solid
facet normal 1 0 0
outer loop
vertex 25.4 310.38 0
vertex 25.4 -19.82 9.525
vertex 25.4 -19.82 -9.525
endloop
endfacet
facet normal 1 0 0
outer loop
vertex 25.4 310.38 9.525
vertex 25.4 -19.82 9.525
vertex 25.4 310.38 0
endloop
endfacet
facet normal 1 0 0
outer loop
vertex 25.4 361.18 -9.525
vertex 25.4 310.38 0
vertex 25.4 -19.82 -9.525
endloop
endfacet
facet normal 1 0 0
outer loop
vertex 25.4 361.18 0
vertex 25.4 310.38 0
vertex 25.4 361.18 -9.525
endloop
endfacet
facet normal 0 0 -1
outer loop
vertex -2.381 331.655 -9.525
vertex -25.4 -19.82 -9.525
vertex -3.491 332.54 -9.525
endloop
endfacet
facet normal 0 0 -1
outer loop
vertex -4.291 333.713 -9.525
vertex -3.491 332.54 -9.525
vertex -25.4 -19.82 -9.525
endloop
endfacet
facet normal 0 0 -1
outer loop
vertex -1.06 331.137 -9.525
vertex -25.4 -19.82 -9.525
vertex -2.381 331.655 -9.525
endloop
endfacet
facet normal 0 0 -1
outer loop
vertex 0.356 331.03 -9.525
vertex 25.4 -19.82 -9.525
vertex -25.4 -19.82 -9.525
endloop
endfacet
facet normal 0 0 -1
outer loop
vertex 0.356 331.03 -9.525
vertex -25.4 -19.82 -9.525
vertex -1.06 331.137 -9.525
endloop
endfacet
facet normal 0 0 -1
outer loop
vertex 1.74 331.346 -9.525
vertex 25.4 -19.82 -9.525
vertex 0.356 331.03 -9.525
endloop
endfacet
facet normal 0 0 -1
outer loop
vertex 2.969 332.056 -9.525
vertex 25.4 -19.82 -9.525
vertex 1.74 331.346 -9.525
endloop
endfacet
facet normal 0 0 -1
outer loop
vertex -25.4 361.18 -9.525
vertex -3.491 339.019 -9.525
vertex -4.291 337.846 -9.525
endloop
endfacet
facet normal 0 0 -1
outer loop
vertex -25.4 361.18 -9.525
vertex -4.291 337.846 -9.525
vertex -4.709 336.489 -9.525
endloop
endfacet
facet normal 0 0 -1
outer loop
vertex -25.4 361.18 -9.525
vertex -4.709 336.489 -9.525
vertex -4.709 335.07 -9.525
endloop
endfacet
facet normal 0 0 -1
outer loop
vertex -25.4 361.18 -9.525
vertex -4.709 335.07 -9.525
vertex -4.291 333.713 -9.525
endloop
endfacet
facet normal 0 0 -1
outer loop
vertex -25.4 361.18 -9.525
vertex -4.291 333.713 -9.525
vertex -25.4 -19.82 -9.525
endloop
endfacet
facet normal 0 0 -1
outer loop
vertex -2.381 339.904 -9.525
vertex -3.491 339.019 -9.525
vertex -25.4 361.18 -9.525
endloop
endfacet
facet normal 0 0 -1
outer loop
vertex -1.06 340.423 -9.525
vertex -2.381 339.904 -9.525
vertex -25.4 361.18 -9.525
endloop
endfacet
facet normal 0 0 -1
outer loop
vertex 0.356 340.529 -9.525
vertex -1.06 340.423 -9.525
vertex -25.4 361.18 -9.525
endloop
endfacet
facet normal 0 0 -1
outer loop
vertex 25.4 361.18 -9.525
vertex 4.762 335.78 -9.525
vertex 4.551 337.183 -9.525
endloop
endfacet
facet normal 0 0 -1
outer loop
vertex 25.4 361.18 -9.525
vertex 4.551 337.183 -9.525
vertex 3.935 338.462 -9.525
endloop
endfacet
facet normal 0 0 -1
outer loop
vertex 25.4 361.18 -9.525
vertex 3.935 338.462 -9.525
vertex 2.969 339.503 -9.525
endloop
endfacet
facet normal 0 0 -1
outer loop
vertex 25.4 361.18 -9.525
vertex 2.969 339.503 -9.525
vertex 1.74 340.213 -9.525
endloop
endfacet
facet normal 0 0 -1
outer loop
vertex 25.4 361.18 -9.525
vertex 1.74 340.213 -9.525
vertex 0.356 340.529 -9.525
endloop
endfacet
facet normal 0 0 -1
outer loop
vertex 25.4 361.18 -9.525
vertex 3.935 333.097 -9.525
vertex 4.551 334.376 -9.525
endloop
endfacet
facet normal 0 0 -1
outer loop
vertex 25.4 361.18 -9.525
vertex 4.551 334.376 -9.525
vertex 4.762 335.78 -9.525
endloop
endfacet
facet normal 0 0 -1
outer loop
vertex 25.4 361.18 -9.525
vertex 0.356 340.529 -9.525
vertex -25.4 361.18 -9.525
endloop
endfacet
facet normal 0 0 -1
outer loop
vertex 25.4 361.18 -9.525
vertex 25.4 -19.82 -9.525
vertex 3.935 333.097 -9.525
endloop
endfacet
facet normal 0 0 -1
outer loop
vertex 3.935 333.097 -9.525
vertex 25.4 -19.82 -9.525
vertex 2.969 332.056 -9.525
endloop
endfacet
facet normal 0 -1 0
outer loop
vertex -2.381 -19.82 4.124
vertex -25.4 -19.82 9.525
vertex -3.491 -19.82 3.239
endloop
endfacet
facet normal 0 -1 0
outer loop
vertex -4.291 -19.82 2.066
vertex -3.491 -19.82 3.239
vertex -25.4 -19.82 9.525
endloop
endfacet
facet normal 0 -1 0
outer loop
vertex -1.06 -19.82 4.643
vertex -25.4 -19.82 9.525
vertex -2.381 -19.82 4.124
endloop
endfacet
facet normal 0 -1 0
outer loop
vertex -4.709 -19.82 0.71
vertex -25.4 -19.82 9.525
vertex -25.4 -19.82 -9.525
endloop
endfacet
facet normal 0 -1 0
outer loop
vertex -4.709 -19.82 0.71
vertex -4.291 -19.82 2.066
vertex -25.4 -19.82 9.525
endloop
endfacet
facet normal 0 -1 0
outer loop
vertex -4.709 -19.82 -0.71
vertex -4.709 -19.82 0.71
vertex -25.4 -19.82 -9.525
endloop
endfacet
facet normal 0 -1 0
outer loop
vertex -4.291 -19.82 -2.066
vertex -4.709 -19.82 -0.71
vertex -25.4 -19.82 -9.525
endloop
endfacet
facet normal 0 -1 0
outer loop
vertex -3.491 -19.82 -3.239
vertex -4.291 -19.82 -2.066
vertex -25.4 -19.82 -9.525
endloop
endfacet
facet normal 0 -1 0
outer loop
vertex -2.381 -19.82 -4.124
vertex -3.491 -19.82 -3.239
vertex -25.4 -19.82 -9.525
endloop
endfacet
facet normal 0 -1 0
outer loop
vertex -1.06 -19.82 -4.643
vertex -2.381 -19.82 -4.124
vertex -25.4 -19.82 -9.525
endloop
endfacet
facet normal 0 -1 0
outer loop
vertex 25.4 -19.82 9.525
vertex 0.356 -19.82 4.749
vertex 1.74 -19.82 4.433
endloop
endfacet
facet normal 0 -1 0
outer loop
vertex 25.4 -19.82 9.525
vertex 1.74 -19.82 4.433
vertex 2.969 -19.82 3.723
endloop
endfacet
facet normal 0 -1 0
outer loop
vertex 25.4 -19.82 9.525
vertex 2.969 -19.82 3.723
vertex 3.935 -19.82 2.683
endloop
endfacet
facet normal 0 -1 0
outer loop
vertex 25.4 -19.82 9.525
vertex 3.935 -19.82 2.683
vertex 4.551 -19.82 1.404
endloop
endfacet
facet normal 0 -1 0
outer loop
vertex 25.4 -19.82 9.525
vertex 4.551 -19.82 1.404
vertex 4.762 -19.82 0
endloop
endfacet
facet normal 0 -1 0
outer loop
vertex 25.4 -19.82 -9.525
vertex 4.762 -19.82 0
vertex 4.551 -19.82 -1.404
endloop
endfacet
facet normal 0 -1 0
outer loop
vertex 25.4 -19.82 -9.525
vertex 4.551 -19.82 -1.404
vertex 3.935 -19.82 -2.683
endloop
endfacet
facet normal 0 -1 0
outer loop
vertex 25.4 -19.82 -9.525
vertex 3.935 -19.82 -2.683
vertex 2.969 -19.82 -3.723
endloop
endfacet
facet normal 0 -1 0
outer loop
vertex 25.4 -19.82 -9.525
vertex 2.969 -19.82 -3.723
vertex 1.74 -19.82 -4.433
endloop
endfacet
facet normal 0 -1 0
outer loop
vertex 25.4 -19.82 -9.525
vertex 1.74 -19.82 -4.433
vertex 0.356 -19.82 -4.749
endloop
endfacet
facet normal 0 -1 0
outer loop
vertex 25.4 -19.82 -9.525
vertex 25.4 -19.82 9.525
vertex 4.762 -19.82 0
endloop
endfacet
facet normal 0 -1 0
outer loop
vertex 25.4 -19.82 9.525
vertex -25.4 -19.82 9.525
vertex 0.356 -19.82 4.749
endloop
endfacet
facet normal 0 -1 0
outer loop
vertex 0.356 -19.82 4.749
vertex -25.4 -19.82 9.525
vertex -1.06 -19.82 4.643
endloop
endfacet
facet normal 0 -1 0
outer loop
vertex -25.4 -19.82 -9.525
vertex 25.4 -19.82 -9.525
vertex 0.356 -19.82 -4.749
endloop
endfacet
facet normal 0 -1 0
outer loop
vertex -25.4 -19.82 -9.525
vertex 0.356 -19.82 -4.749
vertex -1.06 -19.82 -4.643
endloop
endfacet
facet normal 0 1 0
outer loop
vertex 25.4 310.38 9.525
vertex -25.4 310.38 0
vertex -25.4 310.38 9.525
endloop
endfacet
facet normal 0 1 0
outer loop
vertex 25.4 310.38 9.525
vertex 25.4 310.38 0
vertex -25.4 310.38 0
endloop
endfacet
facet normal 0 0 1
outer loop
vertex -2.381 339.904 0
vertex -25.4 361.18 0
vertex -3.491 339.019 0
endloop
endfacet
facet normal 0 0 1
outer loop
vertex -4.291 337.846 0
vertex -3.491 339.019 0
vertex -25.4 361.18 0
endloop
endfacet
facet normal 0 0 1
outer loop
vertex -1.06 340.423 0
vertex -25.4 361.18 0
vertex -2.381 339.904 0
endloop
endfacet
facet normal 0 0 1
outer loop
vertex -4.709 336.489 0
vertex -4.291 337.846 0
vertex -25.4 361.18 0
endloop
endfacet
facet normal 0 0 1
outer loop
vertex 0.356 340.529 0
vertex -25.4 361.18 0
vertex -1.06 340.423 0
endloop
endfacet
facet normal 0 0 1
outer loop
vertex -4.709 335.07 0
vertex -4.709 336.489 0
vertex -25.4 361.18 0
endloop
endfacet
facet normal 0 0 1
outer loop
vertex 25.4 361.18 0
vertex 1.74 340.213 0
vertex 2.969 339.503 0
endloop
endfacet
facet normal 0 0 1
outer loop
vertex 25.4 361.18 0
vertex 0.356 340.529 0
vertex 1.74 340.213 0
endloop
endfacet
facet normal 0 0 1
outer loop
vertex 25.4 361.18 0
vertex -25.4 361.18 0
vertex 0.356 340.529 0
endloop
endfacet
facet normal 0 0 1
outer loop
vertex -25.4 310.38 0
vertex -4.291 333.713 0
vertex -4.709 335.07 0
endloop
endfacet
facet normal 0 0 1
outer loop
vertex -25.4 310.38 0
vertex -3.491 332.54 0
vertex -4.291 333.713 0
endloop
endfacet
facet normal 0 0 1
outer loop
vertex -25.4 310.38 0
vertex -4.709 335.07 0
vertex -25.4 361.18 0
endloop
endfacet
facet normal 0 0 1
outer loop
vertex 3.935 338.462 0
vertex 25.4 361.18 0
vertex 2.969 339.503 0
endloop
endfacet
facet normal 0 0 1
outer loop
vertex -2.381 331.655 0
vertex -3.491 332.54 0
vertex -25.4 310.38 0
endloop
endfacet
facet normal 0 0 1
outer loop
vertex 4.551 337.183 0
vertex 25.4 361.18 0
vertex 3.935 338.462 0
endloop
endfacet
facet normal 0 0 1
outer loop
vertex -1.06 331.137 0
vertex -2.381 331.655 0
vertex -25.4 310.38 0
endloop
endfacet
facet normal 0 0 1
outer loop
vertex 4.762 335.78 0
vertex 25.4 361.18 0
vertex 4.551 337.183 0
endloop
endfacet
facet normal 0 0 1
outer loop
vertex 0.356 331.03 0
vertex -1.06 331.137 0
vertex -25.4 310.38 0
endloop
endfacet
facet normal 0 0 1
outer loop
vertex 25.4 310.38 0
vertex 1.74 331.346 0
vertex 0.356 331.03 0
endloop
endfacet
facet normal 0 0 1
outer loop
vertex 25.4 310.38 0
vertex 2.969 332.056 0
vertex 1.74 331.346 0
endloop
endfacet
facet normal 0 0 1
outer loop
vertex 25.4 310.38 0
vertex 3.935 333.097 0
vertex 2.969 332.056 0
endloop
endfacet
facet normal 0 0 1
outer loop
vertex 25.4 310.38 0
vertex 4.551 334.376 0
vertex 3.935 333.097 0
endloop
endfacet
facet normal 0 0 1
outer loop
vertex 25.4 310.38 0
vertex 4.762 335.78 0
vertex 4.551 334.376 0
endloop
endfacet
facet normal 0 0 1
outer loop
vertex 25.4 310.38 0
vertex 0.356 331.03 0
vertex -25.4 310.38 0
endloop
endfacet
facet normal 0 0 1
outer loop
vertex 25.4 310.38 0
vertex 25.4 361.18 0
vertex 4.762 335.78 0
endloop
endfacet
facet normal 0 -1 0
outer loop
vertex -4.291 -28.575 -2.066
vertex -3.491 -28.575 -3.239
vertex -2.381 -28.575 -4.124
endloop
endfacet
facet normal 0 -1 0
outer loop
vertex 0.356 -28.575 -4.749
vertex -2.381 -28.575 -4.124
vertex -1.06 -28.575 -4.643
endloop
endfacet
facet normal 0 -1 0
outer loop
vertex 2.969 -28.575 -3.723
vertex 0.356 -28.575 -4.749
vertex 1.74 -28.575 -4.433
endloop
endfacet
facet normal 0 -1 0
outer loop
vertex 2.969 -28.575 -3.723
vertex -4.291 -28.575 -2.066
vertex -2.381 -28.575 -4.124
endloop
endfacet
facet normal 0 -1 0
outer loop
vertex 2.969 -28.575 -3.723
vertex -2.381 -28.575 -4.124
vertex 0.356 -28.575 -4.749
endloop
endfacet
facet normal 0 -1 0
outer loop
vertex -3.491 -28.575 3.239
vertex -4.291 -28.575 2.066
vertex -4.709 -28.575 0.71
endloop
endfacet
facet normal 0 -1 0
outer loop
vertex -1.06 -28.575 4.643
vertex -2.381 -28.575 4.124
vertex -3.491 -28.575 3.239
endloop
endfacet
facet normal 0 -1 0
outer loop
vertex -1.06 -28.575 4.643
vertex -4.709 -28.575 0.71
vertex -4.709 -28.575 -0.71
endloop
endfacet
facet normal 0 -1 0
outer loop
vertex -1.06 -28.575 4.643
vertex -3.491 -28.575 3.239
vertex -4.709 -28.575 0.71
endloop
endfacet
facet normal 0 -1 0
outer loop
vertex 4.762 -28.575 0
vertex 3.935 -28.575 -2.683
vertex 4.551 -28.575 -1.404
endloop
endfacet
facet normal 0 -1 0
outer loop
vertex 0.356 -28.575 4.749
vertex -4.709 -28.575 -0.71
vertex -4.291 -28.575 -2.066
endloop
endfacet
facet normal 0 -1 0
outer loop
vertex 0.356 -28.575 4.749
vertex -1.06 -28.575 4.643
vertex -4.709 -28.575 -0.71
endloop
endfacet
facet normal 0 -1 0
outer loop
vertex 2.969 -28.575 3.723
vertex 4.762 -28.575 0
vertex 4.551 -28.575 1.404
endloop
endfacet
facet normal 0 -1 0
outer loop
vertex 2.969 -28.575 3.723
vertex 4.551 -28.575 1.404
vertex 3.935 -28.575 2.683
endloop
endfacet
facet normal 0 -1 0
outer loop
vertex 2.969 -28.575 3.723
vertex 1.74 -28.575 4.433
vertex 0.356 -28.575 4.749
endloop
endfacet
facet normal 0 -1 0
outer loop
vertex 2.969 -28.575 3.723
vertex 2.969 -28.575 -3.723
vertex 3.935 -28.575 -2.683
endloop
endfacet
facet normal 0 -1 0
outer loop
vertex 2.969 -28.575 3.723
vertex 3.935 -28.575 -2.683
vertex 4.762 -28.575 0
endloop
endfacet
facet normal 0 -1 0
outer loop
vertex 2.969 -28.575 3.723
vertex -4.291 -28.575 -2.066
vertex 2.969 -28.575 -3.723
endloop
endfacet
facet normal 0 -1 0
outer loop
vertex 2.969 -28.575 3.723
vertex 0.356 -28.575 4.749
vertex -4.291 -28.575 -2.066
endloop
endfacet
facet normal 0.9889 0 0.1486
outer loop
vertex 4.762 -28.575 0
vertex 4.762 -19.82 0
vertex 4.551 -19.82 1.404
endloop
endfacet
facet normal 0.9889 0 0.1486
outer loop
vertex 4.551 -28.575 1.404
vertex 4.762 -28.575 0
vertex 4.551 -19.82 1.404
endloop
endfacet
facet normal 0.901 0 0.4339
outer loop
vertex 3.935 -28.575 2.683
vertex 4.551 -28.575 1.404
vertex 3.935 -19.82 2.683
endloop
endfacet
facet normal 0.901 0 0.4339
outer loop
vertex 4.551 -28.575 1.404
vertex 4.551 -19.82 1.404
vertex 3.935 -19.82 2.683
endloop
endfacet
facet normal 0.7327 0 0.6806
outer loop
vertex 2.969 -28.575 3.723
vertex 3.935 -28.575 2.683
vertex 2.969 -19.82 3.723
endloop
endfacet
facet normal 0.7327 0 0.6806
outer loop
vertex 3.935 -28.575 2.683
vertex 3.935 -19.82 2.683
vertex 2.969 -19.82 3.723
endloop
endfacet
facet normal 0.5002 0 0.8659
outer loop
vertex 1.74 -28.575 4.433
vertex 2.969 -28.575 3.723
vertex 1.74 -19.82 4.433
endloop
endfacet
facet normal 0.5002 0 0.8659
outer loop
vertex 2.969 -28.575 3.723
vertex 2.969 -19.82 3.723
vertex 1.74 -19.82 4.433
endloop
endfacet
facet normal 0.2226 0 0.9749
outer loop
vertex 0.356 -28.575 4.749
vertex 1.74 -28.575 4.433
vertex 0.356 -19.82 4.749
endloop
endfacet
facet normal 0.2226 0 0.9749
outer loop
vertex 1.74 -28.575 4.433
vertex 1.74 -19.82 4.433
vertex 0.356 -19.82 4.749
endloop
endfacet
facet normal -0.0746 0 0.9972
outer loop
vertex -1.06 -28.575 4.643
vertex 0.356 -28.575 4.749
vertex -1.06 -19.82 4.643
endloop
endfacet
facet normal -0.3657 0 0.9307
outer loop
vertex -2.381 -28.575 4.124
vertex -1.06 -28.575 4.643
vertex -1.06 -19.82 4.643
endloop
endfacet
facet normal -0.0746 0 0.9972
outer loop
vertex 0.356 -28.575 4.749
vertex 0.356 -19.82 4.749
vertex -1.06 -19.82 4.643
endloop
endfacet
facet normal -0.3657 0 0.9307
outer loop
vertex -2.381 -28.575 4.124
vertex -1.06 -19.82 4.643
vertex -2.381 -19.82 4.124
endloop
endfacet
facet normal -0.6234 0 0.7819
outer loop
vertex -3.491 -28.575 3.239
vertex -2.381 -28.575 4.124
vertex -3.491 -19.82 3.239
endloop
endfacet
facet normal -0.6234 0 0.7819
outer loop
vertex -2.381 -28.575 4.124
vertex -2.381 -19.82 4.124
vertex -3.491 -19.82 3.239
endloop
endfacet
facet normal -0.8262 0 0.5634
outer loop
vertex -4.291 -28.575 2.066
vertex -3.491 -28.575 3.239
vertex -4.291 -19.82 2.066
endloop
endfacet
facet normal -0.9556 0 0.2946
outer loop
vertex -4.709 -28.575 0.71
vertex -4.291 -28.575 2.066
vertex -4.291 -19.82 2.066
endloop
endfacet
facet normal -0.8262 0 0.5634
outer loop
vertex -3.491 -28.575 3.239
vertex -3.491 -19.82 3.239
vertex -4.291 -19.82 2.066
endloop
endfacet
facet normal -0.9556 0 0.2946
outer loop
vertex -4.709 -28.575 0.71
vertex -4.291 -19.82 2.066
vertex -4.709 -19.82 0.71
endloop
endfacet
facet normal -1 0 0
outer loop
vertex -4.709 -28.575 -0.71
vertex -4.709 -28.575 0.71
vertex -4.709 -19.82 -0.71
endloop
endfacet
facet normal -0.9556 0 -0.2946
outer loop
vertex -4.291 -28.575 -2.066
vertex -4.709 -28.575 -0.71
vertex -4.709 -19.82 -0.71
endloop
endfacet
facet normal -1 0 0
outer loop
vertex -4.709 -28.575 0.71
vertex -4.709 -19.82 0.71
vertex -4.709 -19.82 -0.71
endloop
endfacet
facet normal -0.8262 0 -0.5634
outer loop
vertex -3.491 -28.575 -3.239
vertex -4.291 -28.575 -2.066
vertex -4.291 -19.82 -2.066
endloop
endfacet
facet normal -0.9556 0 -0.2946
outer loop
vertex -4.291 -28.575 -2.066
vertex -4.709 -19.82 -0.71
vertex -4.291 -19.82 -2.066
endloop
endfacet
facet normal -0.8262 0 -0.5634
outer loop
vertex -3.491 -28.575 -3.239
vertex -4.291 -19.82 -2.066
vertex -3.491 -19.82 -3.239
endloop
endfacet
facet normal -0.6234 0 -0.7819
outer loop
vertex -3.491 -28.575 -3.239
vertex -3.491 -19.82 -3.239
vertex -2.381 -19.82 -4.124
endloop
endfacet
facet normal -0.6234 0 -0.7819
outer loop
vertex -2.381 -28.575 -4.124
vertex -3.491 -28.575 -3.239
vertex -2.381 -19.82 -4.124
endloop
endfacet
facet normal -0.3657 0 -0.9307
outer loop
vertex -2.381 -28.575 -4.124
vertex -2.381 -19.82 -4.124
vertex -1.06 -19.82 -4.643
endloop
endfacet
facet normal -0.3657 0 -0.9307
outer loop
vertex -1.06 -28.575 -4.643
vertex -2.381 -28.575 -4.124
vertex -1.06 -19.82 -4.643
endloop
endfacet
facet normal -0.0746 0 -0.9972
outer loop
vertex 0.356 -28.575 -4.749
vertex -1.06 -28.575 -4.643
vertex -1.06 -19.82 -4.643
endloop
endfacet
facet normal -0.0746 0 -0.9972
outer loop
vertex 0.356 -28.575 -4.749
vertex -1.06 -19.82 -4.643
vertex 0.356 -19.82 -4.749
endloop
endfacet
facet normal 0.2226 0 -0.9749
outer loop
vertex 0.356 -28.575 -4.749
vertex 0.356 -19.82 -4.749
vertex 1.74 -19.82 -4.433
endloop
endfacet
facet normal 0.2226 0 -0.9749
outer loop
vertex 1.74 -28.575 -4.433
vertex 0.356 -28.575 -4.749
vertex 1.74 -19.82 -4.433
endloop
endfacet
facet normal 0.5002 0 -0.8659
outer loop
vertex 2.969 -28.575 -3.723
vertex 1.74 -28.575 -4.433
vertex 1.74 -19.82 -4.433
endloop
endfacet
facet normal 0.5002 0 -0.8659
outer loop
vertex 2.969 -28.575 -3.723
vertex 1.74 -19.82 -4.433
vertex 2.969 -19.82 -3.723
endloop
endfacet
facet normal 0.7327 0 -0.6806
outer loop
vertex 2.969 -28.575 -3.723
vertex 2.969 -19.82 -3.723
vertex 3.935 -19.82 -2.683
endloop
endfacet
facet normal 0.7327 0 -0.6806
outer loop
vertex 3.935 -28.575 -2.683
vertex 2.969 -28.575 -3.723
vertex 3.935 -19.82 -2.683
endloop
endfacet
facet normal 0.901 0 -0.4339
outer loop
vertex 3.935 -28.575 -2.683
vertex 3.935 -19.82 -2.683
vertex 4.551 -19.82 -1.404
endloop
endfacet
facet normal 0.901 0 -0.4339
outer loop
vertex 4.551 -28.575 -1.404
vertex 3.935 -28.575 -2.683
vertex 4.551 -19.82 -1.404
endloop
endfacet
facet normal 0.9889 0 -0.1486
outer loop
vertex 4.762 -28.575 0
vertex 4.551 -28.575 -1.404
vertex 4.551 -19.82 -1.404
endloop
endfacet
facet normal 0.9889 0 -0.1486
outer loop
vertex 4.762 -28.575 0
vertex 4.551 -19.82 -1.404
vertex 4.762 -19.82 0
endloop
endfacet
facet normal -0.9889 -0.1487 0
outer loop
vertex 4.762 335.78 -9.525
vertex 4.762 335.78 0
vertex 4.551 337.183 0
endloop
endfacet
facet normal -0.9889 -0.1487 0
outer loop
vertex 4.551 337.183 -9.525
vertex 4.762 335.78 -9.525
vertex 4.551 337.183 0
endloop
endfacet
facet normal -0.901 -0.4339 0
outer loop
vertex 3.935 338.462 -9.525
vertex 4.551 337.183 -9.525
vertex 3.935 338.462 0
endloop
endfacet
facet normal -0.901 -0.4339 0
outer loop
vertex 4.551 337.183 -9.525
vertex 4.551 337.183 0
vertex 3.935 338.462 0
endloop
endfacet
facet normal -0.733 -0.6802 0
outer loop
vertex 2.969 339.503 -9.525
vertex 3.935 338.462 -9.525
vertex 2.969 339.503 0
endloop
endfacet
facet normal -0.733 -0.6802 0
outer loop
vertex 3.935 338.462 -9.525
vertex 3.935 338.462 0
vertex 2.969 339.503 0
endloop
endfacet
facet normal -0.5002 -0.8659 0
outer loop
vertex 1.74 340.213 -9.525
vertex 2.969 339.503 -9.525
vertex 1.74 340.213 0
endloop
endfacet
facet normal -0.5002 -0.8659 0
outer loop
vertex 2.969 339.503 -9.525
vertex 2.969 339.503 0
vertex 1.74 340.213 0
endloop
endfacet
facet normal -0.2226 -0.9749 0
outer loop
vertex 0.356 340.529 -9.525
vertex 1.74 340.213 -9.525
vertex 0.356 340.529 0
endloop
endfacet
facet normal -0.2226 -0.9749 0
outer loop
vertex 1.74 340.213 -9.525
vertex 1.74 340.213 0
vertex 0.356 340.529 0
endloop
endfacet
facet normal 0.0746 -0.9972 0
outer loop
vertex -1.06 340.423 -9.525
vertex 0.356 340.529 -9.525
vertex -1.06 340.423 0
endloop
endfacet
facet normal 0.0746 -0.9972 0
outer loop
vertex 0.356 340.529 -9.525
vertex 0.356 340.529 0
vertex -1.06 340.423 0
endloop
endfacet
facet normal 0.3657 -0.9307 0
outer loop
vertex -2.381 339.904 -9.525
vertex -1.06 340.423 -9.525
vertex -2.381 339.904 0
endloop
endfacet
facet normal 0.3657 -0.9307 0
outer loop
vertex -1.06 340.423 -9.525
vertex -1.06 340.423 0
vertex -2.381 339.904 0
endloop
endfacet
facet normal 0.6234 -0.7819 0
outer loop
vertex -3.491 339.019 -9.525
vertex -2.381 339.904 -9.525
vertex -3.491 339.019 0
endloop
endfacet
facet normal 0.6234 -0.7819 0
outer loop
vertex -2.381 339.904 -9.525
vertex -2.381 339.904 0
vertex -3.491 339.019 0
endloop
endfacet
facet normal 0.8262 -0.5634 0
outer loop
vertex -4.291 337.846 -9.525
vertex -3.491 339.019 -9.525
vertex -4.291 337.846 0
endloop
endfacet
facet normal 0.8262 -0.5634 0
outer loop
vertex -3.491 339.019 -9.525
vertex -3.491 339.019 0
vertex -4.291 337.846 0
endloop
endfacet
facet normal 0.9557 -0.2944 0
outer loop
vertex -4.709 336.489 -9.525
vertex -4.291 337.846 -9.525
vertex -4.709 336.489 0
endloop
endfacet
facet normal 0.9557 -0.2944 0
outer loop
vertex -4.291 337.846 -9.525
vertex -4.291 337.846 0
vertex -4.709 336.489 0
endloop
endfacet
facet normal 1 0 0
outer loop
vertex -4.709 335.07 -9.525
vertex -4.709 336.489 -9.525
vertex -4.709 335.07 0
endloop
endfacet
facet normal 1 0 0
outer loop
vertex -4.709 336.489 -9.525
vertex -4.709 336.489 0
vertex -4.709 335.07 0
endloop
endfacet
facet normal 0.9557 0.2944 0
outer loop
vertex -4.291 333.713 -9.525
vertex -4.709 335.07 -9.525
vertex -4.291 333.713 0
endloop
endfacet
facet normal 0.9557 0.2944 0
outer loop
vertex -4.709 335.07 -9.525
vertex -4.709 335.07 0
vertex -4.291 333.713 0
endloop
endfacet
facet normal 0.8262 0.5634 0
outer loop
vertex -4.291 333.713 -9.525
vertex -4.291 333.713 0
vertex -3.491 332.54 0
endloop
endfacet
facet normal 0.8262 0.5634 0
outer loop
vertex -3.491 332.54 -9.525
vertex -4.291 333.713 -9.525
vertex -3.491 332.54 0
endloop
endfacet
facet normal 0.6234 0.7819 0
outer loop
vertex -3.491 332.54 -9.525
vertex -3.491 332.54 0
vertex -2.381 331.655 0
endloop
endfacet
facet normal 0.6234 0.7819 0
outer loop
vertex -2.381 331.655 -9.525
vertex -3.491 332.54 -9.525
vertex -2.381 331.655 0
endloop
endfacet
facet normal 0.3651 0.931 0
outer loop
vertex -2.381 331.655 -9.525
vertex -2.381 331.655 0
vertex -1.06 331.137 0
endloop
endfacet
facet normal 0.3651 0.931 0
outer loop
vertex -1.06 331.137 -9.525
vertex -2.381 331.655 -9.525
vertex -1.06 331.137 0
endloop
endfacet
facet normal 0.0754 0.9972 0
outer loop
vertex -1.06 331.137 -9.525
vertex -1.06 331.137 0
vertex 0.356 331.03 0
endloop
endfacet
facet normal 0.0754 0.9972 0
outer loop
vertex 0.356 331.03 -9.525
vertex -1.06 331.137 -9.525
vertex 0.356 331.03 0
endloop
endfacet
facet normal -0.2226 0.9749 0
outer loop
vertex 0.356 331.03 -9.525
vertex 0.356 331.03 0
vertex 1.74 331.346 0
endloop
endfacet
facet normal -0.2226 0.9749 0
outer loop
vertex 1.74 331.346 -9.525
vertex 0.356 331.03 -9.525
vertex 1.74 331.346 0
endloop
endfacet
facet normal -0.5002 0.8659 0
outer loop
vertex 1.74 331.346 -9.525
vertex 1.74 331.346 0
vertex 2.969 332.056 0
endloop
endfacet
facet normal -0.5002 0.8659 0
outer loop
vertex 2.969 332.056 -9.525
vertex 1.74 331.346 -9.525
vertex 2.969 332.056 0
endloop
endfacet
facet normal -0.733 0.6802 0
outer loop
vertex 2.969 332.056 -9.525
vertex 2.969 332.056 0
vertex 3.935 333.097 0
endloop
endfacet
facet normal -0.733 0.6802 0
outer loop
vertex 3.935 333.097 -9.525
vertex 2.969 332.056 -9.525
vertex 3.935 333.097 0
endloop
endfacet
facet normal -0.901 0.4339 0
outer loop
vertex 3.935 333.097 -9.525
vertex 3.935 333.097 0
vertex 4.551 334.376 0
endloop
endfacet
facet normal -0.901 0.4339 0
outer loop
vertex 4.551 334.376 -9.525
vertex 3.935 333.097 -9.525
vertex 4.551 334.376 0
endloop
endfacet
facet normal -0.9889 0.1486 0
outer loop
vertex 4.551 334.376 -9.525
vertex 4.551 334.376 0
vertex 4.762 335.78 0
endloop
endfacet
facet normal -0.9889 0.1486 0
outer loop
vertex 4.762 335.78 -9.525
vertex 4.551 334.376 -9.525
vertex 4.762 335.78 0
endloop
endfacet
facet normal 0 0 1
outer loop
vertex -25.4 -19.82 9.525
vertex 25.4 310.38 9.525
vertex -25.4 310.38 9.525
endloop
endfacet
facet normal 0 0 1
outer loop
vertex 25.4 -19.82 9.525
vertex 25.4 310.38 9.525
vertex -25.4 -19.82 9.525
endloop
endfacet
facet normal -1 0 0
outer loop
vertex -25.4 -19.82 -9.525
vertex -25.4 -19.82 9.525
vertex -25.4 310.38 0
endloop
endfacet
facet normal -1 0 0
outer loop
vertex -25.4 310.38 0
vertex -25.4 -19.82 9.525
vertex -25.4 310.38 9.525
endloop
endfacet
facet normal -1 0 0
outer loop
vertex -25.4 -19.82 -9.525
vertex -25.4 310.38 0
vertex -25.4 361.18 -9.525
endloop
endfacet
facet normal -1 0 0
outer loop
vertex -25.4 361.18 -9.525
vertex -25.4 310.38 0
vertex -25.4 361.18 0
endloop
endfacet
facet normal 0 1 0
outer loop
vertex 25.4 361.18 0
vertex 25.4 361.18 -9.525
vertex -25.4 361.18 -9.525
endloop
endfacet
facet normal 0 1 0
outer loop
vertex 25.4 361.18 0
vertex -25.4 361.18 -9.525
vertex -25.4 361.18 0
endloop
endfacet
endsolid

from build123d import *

# Parameters (mm, degrees)
F1_DEPTH = 25.4
F2_R     = 4.7625
F3_DEPTH = 25.4
F5_R     = 4.7625
F6_DEPTH = 9.525


with BuildPart() as f1:
    # F0 (on Right) → F1 (new body, symmetric)
    with BuildSketch(Plane.YZ):
        Polygon((310.379616, 9.525), (-19.820384, 9.525), (-19.820384, -9.525), (361.179616, -9.525), (361.179616, 0), (310.379616, 0), align=None)
    extrude(amount=F1_DEPTH, both=True)

    # F2 (on Top) → F3 (cut)
    with BuildSketch(Plane.XY):
        with Locations((0, 335.779616)):
            Circle(F2_R)
    extrude(amount=-F3_DEPTH, mode=Mode.SUBTRACT)

    # F5 (on offset) → F6 (join)
    with BuildSketch(Plane.XZ.offset(19.05)):
        Circle(F5_R)
    extrude(amount=F6_DEPTH)


solid = f1.part
